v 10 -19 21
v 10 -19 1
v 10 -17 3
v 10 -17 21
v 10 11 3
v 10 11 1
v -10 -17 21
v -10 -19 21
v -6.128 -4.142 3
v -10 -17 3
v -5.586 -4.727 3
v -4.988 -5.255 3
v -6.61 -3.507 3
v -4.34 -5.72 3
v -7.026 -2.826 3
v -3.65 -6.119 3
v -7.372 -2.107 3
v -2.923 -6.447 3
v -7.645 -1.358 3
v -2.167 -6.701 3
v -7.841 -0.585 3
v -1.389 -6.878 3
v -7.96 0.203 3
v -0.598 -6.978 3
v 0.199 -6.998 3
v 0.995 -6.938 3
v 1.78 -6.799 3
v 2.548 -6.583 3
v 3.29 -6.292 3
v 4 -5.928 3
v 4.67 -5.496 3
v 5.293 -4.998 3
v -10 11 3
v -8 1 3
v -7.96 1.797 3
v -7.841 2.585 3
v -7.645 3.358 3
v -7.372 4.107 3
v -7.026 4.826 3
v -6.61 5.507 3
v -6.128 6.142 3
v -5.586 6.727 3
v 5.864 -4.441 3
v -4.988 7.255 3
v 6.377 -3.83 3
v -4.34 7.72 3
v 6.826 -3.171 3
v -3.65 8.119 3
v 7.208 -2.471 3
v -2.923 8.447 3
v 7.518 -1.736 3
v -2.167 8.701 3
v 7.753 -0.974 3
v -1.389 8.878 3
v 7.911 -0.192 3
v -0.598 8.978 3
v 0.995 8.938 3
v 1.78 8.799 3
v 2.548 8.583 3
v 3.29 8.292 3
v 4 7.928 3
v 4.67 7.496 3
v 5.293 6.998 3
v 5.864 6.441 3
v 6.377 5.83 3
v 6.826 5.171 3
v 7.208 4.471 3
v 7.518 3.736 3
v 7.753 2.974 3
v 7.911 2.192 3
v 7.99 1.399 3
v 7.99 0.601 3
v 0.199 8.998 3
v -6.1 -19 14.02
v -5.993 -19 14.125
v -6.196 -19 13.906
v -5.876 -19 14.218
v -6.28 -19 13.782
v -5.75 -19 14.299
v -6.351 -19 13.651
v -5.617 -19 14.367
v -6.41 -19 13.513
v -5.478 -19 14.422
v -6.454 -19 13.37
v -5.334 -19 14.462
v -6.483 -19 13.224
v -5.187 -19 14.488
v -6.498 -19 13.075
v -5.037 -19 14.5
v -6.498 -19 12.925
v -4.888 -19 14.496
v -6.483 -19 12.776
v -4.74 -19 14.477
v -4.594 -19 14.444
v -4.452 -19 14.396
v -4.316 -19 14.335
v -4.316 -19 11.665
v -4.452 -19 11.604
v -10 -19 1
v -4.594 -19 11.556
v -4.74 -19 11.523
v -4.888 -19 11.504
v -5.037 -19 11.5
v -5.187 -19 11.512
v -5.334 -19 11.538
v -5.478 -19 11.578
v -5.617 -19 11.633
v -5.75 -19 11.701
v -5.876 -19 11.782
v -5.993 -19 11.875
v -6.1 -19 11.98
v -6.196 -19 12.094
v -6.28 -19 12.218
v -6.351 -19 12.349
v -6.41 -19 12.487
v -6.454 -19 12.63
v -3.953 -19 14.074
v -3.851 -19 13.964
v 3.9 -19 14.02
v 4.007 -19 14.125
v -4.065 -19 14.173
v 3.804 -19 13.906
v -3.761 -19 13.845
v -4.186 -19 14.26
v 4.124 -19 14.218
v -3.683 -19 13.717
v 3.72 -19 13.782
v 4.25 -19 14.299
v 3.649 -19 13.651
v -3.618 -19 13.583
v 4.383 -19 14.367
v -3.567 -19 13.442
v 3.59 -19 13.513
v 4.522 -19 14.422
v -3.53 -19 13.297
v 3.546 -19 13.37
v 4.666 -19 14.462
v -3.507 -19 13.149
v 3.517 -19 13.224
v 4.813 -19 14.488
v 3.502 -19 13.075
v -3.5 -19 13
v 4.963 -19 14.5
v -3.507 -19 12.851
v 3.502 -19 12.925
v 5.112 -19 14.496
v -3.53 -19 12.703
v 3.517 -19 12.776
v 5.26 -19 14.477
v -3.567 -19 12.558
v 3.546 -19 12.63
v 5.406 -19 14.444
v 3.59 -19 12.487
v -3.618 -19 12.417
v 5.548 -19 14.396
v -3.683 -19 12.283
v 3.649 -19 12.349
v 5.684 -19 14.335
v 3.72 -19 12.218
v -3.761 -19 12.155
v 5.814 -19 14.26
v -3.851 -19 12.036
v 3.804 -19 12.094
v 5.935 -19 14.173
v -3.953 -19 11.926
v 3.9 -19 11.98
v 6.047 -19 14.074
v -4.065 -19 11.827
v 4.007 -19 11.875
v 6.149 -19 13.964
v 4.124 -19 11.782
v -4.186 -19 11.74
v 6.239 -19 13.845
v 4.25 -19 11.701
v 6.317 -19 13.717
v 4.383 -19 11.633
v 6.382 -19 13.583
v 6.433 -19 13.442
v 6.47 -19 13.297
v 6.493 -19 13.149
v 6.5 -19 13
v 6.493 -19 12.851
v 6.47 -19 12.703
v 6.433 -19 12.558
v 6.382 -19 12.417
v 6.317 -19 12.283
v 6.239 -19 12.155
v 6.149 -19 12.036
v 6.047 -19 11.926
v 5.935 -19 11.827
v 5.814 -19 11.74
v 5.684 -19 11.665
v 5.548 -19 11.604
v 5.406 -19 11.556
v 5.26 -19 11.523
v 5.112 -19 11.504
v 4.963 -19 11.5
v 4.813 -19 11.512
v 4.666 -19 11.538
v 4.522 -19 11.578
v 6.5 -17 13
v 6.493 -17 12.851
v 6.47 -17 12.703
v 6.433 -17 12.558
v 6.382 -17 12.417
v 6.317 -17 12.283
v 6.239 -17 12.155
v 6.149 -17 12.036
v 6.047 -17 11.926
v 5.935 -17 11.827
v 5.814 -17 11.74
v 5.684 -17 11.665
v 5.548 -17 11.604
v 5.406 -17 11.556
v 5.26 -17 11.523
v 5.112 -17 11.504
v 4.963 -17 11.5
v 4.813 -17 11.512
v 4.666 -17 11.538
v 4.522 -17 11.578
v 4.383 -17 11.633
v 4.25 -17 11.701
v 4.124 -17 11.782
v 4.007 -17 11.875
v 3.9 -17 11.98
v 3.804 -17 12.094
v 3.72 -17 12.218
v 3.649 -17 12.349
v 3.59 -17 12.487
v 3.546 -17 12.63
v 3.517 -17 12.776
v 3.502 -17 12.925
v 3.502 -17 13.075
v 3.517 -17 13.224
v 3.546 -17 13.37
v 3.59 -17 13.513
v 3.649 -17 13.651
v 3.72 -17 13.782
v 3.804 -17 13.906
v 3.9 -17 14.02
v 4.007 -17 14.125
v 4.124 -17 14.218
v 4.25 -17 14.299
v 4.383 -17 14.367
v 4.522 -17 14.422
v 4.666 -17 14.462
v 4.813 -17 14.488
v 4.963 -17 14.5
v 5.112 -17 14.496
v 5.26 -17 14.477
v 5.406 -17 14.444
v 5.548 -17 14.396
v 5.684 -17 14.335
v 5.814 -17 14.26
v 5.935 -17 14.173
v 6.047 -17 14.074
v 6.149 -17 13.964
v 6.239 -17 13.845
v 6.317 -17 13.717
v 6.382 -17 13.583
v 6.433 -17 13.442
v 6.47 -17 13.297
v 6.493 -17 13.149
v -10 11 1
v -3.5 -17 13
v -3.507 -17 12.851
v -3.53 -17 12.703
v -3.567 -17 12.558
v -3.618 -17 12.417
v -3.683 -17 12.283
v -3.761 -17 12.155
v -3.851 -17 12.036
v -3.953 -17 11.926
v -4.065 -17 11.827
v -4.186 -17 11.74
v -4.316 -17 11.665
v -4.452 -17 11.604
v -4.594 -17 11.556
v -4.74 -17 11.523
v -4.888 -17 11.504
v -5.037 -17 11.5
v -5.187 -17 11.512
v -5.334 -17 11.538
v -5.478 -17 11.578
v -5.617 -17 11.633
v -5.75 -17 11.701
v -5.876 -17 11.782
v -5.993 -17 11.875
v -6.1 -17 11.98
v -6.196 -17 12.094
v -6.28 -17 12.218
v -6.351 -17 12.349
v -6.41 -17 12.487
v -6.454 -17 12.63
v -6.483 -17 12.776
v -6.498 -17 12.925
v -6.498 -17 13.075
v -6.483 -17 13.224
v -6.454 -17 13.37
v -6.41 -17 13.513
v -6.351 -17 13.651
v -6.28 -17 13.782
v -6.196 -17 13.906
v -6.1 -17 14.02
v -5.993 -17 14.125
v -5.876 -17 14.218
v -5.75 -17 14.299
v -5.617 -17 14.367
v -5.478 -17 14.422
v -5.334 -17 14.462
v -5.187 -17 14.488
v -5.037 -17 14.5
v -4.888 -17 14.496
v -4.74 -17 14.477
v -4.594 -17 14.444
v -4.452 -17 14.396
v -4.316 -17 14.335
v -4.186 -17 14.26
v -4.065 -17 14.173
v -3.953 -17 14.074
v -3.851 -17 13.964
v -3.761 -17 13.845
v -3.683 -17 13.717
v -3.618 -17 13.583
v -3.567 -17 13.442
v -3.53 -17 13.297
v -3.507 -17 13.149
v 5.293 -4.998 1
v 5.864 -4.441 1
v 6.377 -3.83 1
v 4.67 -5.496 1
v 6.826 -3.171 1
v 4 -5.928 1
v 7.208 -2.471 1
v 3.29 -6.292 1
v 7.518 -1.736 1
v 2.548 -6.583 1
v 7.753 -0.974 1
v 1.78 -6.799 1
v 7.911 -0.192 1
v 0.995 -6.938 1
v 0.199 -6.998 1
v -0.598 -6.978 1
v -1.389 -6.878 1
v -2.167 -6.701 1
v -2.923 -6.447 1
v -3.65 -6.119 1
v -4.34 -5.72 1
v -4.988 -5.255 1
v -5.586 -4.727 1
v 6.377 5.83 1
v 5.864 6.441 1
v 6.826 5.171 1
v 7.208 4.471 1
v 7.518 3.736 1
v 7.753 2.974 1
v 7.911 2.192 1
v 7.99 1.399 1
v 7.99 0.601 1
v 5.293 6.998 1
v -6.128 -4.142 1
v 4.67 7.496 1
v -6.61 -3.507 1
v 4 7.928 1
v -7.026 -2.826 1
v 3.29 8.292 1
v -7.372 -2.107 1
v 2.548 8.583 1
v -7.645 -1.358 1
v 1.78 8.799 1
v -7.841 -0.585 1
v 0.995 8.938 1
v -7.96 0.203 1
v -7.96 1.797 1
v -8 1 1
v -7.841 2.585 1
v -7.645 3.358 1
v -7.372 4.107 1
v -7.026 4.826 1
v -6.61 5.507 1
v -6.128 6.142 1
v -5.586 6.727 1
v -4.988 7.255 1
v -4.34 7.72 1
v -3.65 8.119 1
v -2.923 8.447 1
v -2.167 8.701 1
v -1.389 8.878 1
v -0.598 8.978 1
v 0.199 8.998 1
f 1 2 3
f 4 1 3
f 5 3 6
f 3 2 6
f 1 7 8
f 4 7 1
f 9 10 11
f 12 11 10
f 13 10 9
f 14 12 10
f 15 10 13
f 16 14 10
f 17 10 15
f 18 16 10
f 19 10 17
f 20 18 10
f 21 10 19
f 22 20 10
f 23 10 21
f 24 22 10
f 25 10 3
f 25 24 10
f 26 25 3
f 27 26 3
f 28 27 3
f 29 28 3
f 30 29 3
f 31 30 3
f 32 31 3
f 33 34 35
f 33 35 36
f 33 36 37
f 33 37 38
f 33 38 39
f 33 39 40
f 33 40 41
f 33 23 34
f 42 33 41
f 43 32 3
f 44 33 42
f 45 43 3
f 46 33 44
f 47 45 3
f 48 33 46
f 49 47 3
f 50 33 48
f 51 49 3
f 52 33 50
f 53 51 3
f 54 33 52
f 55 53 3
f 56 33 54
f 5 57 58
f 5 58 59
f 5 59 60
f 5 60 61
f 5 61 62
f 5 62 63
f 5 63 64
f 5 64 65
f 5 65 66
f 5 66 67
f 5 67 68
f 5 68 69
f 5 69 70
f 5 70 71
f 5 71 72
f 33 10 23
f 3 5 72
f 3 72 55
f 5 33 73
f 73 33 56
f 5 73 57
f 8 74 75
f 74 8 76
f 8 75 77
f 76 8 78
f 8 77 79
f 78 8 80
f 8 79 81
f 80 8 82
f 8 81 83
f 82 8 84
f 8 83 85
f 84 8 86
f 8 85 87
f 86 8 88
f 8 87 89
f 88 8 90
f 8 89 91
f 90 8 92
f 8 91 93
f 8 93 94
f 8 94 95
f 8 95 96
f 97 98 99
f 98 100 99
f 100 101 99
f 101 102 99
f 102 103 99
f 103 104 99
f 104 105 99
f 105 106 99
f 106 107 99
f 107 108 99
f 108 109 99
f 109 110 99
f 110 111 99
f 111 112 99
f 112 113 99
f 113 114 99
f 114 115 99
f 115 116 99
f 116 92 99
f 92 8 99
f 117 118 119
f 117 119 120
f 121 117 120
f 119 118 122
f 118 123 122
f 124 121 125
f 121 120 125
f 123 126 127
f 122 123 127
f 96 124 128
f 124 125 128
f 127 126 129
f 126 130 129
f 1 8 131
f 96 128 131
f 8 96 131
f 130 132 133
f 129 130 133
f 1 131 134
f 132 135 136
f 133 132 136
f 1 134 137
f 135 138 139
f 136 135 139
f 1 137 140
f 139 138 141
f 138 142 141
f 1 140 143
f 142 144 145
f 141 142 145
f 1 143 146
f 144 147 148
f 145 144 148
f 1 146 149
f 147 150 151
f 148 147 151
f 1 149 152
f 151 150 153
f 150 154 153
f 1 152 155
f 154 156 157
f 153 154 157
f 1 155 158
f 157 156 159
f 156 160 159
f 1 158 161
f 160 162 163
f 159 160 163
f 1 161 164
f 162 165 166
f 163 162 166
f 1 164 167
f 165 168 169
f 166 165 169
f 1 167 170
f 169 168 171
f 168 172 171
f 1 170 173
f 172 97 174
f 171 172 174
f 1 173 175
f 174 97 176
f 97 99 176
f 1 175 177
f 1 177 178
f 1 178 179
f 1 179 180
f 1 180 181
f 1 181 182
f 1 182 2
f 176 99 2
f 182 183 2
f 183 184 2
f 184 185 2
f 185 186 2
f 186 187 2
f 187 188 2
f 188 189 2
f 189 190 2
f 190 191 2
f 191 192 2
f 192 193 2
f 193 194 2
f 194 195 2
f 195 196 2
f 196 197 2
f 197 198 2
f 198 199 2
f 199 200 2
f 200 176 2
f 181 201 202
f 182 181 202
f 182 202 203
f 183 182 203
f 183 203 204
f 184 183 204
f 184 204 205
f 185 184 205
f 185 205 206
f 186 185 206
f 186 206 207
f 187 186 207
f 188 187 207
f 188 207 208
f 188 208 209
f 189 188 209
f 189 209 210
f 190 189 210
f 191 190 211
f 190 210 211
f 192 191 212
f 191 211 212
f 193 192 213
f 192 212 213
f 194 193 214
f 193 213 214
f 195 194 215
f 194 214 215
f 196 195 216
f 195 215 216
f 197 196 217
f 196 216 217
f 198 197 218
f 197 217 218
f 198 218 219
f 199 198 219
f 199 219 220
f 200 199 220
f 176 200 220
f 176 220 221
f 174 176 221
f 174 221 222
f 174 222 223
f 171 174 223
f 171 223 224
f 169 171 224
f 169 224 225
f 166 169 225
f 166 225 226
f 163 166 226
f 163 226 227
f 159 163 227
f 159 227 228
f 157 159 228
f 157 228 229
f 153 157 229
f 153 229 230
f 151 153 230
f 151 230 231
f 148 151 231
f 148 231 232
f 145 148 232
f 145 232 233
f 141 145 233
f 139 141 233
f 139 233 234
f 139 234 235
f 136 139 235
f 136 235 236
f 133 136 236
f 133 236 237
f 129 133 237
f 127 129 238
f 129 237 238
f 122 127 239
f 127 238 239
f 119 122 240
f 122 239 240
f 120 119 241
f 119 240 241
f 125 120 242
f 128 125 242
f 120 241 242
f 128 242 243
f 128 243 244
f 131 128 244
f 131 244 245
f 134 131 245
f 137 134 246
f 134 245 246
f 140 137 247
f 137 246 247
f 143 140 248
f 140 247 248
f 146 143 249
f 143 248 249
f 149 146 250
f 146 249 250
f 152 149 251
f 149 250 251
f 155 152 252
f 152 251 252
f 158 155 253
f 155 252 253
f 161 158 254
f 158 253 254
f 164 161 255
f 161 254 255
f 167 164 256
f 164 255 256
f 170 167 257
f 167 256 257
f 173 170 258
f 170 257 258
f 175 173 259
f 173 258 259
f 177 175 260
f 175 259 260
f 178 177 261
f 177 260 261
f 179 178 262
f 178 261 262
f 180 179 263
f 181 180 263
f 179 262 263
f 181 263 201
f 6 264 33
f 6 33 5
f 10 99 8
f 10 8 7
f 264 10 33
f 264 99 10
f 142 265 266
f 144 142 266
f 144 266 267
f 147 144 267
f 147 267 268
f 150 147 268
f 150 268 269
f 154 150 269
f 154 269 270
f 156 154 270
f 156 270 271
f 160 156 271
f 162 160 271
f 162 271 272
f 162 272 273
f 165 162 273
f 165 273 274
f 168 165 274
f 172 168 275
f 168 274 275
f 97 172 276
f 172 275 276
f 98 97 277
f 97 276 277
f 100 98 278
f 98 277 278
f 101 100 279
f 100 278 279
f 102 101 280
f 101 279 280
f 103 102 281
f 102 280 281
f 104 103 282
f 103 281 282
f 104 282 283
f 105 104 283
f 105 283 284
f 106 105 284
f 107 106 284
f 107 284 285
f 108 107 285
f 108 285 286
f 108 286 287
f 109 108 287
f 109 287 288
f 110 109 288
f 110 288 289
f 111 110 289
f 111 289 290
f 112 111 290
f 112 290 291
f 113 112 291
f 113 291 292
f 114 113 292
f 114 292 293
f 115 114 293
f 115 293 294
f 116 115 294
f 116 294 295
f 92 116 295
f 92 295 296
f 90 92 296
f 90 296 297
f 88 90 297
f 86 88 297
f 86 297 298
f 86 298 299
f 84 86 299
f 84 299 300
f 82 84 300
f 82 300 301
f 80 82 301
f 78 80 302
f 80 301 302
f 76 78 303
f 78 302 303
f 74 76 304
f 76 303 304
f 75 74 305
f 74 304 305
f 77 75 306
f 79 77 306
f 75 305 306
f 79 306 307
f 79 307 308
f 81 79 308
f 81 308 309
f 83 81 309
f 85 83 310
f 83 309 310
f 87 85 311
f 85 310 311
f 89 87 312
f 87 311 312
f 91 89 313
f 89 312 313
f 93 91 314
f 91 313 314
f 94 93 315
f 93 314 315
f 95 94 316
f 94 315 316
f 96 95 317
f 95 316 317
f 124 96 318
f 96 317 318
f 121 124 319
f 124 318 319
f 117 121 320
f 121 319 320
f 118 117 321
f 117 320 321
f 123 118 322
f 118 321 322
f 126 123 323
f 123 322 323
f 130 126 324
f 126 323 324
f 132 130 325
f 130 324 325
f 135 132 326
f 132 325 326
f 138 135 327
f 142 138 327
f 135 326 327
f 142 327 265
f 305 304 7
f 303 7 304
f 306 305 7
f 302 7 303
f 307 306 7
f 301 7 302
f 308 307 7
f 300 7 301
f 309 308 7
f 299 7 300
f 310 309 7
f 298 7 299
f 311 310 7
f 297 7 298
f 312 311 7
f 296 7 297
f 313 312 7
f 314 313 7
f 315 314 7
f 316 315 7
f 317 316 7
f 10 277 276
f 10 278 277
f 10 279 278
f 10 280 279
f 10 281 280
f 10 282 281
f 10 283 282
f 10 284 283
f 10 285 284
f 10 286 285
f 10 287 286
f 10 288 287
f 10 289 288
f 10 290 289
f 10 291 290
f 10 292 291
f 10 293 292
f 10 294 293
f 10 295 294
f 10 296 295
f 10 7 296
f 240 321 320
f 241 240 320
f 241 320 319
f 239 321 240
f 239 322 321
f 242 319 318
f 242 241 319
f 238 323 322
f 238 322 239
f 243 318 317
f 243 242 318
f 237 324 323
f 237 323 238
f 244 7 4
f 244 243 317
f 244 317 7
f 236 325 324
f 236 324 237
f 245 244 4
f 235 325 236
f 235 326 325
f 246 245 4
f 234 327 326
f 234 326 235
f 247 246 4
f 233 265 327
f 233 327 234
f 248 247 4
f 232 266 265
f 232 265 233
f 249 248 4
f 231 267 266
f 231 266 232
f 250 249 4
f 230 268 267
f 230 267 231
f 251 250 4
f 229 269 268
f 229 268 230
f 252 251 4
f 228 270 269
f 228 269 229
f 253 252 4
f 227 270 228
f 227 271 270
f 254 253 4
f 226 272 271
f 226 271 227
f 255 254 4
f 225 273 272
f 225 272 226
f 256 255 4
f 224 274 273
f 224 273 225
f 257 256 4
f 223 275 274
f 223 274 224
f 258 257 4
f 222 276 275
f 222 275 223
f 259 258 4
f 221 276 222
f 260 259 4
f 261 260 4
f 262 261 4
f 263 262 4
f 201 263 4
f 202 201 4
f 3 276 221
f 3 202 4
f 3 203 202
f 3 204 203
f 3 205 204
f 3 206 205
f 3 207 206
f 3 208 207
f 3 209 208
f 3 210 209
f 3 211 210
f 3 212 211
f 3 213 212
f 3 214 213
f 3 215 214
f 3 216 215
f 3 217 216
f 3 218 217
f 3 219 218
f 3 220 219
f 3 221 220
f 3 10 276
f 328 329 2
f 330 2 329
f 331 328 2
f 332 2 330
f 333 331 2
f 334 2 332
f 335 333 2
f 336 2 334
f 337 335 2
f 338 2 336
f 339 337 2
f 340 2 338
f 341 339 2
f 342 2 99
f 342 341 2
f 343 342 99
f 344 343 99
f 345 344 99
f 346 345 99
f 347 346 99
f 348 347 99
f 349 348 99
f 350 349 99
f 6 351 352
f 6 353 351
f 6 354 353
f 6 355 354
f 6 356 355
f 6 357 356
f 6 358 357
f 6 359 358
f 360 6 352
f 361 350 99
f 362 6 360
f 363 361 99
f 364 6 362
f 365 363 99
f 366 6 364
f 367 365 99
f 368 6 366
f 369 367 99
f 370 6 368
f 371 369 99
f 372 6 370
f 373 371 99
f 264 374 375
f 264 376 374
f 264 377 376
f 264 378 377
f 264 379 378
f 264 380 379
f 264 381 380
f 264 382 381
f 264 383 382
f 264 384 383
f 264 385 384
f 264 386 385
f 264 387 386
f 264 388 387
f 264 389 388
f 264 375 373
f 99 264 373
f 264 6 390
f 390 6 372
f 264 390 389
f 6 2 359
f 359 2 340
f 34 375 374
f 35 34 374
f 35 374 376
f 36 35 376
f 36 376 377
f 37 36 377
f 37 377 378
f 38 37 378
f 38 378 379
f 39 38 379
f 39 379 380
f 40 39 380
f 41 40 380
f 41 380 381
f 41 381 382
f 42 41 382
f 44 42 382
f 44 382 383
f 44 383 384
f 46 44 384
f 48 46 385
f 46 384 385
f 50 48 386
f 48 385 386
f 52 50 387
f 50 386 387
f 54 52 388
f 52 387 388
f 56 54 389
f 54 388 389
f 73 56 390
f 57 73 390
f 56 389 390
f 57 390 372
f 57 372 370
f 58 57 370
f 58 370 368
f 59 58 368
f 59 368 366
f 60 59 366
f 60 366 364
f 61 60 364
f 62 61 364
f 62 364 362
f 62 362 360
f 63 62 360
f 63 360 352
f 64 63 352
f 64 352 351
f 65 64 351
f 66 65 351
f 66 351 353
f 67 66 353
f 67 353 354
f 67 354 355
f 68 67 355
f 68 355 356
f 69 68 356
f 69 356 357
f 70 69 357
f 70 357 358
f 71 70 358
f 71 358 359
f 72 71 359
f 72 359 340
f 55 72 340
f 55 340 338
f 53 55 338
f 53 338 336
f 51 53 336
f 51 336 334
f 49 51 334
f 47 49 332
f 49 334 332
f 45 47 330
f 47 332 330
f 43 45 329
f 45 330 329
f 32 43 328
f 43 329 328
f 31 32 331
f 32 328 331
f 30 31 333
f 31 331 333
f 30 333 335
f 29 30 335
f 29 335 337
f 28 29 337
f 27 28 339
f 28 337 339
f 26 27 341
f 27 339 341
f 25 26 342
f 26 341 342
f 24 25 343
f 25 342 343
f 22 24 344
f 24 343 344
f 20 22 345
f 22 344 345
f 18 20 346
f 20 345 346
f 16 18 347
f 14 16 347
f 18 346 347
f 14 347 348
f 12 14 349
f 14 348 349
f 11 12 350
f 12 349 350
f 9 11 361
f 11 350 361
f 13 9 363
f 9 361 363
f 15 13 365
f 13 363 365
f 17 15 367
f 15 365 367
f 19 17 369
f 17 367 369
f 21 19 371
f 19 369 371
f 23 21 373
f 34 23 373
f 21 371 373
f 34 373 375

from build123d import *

# Parameters (mm, degrees)
SKETCH_1_W          = 20
SKETCH_1_H          = 38
EXTRUDE_1_DEPTH     = 3
SKETCH_2_W          = 20
SKETCH_2_H          = 3
EXTRUDE_2_DEPTH     = 35
SKETCH_4_R          = 1.5
CUT_EXTRUDE_2_DEPTH = 10
SKETCH_6_R          = 8
CUT_EXTRUDE_4_DEPTH = 10
SKETCH_7_W          = 48.70277248
SKETCH_7_H          = 15.025597173
CUT_EXTRUDE_5_DEPTH = 17
SKETCH_8_W          = 23.770758151
SKETCH_8_H          = 7.865139004
CUT_EXTRUDE_6_DEPTH = 8
SKETCH_9_W          = 25.851926442
SKETCH_9_H          = 19.370122162
CUT_EXTRUDE_7_DEPTH = 1
SKETCH_10_W         = 62.66737892
SKETCH_10_H         = 43.463838198
CUT_EXTRUDE_8_DEPTH = 1


with BuildPart() as part:
    # 草图1 → 凸台-拉伸1 (new body)
    with BuildSketch(Plane.XY):
        Rectangle(SKETCH_1_W, SKETCH_1_H)
    extrude(amount=EXTRUDE_1_DEPTH)

    # 草图2 → 凸台-拉伸2 (add)
    with BuildSketch(Plane.XY.offset(3)):
        with Locations((0, -17.5)):
            Rectangle(SKETCH_2_W, SKETCH_2_H)
    extrude(amount=EXTRUDE_2_DEPTH)

    # 草图4 → 切除-拉伸2 (cut)
    with BuildSketch(Plane(origin=(0, -16, 0), x_dir=(1, 0, 0), z_dir=(0, 1, 0))):
        with Locations((-5, -13)):
            Circle(SKETCH_4_R)
        with Locations((5, -13)):
            Circle(SKETCH_4_R)
    extrude(amount=-CUT_EXTRUDE_2_DEPTH, mode=Mode.SUBTRACT)

    # 草图6 → 切除-拉伸4 (cut)
    with BuildSketch(Plane(origin=(0, 0, 0), x_dir=(-1, 0, 0), z_dir=(0, 0, -1))):
        with Locations((0, 1)):
            Circle(SKETCH_6_R)
    extrude(amount=-CUT_EXTRUDE_4_DEPTH, mode=Mode.SUBTRACT)

    # 草图7 → 切除-拉伸5 (cut)
    with BuildSketch(Plane.XY.offset(38)):
        with Locations((-7.483280409, -20.314408955)):
            Rectangle(SKETCH_7_W, SKETCH_7_H)
    extrude(amount=-CUT_EXTRUDE_5_DEPTH, mode=Mode.SUBTRACT)

    # 草图8 → 切除-拉伸6 (cut)
    with BuildSketch(Plane(origin=(0, 19, 0), x_dir=(1, 0, 0), z_dir=(0, 1, 0))):
        with Locations((-0.181621183, -1.317277333)):
            Rectangle(SKETCH_8_W, SKETCH_8_H)
    extrude(amount=-CUT_EXTRUDE_6_DEPTH, mode=Mode.SUBTRACT)

    # 草图9 → 切除-拉伸7 (cut)
    with BuildSketch(Plane(origin=(0, -16, 0), x_dir=(1, 0, 0), z_dir=(0, 1, 0))):
        with Locations((2.925963221, -12.685061081)):
            Rectangle(SKETCH_9_W, SKETCH_9_H)
    extrude(amount=-CUT_EXTRUDE_7_DEPTH, mode=Mode.SUBTRACT)

    # 草图10 → 切除-拉伸8 (cut)
    with BuildSketch(Plane(origin=(0, 0, 0), x_dir=(-1, 0, 0), z_dir=(0, 0, -1))):
        with Locations((0.038577245, -3.3946505)):
            Rectangle(SKETCH_10_W, SKETCH_10_H)
    extrude(amount=-CUT_EXTRUDE_8_DEPTH, mode=Mode.SUBTRACT)


solid = part.part
